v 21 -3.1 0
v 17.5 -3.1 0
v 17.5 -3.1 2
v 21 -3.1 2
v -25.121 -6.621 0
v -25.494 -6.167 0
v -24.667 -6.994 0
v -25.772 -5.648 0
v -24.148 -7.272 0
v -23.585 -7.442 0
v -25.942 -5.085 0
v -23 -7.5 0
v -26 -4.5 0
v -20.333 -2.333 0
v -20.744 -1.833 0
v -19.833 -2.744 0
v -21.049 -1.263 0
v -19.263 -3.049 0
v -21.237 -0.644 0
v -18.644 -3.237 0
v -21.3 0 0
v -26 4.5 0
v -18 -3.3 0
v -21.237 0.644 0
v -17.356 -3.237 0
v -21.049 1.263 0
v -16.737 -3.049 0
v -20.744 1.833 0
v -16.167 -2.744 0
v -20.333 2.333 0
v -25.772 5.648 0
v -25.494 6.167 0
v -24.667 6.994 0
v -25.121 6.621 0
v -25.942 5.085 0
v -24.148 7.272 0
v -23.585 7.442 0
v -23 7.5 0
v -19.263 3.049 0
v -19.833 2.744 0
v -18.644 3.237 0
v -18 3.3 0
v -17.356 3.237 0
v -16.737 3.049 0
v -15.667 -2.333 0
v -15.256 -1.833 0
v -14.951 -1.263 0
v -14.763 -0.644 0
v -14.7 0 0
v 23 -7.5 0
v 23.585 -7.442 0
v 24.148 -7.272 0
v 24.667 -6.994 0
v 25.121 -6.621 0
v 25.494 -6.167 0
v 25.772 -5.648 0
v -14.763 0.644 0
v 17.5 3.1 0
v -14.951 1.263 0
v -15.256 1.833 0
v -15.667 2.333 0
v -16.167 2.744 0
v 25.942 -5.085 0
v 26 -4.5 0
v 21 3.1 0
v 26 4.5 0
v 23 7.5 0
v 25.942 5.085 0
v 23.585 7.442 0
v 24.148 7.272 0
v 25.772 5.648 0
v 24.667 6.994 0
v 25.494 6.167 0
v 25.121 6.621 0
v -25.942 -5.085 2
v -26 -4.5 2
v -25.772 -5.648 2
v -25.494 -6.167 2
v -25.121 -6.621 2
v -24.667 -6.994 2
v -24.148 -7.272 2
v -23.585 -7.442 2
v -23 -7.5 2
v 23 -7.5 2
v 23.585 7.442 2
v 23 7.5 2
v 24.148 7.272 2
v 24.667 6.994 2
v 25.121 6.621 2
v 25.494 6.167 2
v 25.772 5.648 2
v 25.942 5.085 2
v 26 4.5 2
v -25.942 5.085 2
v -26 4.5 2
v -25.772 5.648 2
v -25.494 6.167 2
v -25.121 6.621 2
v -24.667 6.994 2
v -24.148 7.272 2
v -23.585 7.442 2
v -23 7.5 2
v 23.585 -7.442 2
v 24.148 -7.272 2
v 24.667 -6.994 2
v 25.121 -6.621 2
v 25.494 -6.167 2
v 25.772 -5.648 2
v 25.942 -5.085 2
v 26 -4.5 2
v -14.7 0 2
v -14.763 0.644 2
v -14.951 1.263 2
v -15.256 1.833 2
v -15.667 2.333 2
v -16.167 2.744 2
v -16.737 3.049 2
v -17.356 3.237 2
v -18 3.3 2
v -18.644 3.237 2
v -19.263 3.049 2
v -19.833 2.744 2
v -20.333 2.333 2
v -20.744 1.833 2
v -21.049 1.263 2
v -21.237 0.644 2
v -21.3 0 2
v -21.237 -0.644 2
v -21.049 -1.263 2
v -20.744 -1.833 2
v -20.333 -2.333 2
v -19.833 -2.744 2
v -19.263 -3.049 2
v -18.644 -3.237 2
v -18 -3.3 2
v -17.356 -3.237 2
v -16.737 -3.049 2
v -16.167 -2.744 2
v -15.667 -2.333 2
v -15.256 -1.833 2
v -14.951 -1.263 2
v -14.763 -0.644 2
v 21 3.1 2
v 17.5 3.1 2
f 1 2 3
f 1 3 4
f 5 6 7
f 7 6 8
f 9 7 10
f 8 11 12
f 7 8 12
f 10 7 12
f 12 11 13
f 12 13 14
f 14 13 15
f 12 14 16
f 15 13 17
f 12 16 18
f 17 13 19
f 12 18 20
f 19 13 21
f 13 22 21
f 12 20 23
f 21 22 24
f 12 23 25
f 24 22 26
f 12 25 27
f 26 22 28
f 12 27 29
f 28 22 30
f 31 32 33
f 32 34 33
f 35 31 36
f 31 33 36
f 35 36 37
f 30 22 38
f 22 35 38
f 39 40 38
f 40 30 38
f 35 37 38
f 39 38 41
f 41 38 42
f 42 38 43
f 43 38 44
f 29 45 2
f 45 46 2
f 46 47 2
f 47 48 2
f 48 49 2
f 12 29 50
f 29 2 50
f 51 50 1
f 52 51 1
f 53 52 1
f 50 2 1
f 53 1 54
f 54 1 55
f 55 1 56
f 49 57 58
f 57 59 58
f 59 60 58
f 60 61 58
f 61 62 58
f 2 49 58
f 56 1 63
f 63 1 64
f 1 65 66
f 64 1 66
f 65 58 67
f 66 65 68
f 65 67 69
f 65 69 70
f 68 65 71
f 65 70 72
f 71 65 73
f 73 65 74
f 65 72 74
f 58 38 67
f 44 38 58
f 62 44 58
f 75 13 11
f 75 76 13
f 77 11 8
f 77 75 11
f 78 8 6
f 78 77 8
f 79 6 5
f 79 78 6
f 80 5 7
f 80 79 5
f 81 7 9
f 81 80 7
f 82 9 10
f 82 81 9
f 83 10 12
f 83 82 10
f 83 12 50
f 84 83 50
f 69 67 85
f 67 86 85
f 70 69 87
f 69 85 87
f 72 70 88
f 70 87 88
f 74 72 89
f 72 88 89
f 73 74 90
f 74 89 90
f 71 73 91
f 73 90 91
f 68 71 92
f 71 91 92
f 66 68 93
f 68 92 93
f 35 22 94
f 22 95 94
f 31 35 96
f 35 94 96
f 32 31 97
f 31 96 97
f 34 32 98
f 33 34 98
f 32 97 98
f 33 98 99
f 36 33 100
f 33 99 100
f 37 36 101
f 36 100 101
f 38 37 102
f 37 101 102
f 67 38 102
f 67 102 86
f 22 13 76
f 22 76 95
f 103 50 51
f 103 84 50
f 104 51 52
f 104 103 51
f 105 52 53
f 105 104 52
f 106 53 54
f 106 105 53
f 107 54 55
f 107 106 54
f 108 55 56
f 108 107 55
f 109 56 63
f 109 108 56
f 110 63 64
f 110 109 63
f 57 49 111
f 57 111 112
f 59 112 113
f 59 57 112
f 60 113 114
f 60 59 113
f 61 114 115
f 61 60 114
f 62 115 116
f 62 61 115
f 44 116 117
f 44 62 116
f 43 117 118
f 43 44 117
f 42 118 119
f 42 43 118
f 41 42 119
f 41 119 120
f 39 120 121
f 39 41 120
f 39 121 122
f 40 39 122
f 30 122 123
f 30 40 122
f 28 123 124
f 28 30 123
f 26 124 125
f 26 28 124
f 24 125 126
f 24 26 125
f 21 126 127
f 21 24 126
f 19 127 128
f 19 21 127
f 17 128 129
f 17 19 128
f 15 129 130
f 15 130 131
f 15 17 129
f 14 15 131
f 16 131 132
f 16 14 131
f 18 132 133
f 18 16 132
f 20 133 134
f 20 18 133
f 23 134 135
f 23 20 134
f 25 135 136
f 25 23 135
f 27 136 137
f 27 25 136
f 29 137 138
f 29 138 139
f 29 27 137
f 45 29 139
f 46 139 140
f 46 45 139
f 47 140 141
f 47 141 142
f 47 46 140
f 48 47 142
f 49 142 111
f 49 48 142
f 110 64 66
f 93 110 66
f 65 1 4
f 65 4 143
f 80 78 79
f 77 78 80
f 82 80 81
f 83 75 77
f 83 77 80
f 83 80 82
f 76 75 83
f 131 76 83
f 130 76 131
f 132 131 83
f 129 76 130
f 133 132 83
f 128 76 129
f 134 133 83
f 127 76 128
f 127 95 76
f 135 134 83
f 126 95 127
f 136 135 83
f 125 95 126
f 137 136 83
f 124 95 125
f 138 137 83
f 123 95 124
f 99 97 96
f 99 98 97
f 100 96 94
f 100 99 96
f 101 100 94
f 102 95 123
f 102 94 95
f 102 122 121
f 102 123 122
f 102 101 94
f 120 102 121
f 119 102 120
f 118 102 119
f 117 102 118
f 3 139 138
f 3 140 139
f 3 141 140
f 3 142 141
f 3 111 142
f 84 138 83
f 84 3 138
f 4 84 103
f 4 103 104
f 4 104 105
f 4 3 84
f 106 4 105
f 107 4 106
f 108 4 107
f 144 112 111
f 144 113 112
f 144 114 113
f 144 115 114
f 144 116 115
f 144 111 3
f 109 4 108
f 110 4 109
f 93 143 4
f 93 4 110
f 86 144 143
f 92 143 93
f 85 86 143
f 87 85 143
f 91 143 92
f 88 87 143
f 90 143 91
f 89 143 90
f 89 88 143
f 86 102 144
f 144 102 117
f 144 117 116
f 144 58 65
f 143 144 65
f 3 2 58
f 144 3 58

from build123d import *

# Parameters (mm, degrees)
SKETCH_W   = 52
SKETCH_H   = 15
SKETCH_R   = 3.3
SKETCH_W_2 = 3.5
SKETCH_H_2 = 6.2
PAD_DEPTH  = 2
FILLET_R   = 3


with BuildPart() as part:
    # Sketch → Pad (new body)
    with BuildSketch(Plane.XY):
        Rectangle(SKETCH_W, SKETCH_H)
        with Locations((-18, 0)):
            Circle(SKETCH_R, mode=Mode.SUBTRACT)
        with Locations((19.25, 0)):
            Rectangle(SKETCH_W_2, SKETCH_H_2, mode=Mode.SUBTRACT)
    extrude(amount=PAD_DEPTH)

    # Fillet
    fillet_edges = [part.edges().sort_by_distance(p)[0] for p in [
        (26, -7.5, 1),
        (26, 7.5, 1),
        (-26, 7.5, 1),
        (-26, -7.5, 1),
    ]]
    fillet(fillet_edges, radius=FILLET_R)


solid = part.part
